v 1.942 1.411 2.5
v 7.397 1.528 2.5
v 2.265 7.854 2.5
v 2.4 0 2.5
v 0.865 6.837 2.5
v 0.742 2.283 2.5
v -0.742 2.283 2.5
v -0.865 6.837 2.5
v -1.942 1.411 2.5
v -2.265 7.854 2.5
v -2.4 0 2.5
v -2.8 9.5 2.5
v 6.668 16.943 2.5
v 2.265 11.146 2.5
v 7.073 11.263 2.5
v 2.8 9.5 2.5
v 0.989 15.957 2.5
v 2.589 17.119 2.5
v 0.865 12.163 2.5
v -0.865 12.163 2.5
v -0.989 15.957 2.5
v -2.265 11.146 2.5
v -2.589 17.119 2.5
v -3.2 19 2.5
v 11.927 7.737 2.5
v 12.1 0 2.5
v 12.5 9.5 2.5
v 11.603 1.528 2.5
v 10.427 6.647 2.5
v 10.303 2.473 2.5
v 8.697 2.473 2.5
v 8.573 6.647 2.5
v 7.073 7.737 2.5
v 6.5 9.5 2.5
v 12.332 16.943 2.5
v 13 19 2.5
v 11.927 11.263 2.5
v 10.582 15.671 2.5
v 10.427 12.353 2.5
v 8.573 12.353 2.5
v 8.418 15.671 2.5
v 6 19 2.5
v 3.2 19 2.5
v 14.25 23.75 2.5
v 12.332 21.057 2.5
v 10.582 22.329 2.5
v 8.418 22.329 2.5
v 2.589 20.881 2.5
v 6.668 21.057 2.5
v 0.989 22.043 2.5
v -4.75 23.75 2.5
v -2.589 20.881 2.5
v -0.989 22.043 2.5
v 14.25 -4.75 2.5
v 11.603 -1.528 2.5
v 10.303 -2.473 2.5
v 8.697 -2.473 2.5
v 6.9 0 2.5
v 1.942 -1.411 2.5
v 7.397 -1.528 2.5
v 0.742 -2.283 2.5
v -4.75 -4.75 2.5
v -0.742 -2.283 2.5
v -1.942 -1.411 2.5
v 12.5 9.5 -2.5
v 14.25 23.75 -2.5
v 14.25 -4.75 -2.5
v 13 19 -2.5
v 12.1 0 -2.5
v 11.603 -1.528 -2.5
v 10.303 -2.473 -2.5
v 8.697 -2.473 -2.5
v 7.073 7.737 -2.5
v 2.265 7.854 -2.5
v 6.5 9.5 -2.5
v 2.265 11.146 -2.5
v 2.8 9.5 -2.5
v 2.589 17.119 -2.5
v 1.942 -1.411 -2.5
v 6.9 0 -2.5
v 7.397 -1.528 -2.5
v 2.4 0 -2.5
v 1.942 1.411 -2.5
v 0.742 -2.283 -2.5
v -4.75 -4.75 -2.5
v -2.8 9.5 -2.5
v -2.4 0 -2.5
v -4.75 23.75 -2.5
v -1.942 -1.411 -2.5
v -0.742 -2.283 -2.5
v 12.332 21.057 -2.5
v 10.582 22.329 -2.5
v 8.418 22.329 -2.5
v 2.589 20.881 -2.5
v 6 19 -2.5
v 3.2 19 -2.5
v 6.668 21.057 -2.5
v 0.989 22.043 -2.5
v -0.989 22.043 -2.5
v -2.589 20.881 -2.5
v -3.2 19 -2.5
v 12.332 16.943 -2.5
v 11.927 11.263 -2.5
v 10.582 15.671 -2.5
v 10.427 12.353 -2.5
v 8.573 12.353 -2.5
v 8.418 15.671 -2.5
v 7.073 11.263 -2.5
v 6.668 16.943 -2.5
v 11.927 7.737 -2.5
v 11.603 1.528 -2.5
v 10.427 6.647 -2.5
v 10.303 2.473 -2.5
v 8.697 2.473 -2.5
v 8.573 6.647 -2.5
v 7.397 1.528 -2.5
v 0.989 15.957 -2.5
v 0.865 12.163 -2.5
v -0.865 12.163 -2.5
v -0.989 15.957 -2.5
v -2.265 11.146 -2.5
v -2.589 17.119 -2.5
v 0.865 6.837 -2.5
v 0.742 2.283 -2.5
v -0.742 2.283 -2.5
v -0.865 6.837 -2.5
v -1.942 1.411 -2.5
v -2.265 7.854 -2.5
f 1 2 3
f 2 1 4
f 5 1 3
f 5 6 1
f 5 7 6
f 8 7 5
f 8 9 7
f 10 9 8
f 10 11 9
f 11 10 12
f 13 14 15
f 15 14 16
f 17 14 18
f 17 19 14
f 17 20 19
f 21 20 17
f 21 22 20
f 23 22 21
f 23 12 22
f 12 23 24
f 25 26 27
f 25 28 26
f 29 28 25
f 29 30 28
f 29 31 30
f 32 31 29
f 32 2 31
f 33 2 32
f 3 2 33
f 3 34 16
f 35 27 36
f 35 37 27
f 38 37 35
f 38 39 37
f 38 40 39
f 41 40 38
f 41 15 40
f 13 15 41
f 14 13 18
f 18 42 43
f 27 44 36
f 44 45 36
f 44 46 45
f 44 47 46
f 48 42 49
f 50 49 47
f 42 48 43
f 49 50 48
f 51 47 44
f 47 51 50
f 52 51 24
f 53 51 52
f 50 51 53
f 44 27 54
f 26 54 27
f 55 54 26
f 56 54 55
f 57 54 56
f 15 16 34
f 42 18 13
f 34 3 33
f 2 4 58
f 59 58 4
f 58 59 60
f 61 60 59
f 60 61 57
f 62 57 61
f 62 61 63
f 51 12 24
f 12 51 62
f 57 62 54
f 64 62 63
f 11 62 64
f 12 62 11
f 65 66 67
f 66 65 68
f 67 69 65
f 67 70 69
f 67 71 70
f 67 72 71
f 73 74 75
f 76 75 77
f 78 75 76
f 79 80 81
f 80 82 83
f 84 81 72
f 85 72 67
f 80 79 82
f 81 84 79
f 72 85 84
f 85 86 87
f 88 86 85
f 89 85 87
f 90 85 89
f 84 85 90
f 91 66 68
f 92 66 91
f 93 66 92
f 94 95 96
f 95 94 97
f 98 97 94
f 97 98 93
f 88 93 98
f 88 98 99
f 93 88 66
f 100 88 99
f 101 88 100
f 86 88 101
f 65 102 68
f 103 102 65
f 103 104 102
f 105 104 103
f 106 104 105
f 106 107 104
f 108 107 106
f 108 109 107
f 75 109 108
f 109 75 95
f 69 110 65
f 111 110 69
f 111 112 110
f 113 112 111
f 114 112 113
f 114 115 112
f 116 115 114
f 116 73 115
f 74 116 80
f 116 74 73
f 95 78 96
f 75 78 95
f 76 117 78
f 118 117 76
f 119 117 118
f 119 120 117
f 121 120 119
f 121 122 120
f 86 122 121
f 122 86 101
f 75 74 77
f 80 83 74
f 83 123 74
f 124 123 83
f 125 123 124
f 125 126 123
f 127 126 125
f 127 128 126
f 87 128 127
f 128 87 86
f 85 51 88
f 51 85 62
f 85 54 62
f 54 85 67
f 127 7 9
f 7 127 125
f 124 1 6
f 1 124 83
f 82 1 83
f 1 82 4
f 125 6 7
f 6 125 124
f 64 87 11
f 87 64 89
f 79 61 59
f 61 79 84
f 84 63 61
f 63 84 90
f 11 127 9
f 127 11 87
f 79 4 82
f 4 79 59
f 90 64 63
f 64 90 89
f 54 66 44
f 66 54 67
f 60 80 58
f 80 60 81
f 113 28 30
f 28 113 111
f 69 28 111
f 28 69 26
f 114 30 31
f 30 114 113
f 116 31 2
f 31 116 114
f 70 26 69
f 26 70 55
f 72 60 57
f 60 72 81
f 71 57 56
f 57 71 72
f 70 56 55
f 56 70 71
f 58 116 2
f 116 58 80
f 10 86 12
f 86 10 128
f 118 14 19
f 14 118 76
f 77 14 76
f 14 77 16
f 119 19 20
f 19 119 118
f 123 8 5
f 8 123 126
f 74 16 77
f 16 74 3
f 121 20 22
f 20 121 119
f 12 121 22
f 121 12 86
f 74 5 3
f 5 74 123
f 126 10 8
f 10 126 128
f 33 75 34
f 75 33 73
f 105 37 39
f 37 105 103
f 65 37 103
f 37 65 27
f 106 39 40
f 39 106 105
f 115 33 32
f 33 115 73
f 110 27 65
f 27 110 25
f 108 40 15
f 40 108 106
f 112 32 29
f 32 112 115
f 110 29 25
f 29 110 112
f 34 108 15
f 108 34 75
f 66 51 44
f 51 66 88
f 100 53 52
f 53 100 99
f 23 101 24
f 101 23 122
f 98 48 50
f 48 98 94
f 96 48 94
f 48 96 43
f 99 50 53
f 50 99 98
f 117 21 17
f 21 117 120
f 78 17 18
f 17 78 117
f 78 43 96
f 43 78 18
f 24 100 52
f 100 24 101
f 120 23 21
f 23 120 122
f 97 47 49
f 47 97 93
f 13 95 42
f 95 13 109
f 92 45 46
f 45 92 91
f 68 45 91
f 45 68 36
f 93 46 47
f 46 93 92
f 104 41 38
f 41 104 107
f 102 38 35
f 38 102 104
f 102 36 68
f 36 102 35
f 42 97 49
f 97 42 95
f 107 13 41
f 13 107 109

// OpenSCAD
// Bolt experiment

// Inputs
holes = [2.4,2.6,2.8,3.0,3.2,3.5];
num_wide = 2;
num_depth = 3;
margin = 3;
depth = 5;
lip = 0.0;

// Method
maxsize = max(holes)+ margin * 2; 
echo(maxsize=maxsize);

for(i = [0:1:len(holes)-1]) {
    radius = holes[i];
    x = i % num_wide;
    y = ceil((i-(num_wide-1))/num_wide) % num_depth;
    hole(radius, [x * maxsize, y * maxsize], depth + i*lip, maxsize);
}

module hole(radius, position, depth, size) { 
    echo (radius=radius);
    echo(size=size);
    translate([position[0], position[1], 0]) {
        difference() {
            cube([size, size, depth], center = true); 
            cylinder($fn=10, h = depth + 1, r=radius, center = true);
        }
    }
}
